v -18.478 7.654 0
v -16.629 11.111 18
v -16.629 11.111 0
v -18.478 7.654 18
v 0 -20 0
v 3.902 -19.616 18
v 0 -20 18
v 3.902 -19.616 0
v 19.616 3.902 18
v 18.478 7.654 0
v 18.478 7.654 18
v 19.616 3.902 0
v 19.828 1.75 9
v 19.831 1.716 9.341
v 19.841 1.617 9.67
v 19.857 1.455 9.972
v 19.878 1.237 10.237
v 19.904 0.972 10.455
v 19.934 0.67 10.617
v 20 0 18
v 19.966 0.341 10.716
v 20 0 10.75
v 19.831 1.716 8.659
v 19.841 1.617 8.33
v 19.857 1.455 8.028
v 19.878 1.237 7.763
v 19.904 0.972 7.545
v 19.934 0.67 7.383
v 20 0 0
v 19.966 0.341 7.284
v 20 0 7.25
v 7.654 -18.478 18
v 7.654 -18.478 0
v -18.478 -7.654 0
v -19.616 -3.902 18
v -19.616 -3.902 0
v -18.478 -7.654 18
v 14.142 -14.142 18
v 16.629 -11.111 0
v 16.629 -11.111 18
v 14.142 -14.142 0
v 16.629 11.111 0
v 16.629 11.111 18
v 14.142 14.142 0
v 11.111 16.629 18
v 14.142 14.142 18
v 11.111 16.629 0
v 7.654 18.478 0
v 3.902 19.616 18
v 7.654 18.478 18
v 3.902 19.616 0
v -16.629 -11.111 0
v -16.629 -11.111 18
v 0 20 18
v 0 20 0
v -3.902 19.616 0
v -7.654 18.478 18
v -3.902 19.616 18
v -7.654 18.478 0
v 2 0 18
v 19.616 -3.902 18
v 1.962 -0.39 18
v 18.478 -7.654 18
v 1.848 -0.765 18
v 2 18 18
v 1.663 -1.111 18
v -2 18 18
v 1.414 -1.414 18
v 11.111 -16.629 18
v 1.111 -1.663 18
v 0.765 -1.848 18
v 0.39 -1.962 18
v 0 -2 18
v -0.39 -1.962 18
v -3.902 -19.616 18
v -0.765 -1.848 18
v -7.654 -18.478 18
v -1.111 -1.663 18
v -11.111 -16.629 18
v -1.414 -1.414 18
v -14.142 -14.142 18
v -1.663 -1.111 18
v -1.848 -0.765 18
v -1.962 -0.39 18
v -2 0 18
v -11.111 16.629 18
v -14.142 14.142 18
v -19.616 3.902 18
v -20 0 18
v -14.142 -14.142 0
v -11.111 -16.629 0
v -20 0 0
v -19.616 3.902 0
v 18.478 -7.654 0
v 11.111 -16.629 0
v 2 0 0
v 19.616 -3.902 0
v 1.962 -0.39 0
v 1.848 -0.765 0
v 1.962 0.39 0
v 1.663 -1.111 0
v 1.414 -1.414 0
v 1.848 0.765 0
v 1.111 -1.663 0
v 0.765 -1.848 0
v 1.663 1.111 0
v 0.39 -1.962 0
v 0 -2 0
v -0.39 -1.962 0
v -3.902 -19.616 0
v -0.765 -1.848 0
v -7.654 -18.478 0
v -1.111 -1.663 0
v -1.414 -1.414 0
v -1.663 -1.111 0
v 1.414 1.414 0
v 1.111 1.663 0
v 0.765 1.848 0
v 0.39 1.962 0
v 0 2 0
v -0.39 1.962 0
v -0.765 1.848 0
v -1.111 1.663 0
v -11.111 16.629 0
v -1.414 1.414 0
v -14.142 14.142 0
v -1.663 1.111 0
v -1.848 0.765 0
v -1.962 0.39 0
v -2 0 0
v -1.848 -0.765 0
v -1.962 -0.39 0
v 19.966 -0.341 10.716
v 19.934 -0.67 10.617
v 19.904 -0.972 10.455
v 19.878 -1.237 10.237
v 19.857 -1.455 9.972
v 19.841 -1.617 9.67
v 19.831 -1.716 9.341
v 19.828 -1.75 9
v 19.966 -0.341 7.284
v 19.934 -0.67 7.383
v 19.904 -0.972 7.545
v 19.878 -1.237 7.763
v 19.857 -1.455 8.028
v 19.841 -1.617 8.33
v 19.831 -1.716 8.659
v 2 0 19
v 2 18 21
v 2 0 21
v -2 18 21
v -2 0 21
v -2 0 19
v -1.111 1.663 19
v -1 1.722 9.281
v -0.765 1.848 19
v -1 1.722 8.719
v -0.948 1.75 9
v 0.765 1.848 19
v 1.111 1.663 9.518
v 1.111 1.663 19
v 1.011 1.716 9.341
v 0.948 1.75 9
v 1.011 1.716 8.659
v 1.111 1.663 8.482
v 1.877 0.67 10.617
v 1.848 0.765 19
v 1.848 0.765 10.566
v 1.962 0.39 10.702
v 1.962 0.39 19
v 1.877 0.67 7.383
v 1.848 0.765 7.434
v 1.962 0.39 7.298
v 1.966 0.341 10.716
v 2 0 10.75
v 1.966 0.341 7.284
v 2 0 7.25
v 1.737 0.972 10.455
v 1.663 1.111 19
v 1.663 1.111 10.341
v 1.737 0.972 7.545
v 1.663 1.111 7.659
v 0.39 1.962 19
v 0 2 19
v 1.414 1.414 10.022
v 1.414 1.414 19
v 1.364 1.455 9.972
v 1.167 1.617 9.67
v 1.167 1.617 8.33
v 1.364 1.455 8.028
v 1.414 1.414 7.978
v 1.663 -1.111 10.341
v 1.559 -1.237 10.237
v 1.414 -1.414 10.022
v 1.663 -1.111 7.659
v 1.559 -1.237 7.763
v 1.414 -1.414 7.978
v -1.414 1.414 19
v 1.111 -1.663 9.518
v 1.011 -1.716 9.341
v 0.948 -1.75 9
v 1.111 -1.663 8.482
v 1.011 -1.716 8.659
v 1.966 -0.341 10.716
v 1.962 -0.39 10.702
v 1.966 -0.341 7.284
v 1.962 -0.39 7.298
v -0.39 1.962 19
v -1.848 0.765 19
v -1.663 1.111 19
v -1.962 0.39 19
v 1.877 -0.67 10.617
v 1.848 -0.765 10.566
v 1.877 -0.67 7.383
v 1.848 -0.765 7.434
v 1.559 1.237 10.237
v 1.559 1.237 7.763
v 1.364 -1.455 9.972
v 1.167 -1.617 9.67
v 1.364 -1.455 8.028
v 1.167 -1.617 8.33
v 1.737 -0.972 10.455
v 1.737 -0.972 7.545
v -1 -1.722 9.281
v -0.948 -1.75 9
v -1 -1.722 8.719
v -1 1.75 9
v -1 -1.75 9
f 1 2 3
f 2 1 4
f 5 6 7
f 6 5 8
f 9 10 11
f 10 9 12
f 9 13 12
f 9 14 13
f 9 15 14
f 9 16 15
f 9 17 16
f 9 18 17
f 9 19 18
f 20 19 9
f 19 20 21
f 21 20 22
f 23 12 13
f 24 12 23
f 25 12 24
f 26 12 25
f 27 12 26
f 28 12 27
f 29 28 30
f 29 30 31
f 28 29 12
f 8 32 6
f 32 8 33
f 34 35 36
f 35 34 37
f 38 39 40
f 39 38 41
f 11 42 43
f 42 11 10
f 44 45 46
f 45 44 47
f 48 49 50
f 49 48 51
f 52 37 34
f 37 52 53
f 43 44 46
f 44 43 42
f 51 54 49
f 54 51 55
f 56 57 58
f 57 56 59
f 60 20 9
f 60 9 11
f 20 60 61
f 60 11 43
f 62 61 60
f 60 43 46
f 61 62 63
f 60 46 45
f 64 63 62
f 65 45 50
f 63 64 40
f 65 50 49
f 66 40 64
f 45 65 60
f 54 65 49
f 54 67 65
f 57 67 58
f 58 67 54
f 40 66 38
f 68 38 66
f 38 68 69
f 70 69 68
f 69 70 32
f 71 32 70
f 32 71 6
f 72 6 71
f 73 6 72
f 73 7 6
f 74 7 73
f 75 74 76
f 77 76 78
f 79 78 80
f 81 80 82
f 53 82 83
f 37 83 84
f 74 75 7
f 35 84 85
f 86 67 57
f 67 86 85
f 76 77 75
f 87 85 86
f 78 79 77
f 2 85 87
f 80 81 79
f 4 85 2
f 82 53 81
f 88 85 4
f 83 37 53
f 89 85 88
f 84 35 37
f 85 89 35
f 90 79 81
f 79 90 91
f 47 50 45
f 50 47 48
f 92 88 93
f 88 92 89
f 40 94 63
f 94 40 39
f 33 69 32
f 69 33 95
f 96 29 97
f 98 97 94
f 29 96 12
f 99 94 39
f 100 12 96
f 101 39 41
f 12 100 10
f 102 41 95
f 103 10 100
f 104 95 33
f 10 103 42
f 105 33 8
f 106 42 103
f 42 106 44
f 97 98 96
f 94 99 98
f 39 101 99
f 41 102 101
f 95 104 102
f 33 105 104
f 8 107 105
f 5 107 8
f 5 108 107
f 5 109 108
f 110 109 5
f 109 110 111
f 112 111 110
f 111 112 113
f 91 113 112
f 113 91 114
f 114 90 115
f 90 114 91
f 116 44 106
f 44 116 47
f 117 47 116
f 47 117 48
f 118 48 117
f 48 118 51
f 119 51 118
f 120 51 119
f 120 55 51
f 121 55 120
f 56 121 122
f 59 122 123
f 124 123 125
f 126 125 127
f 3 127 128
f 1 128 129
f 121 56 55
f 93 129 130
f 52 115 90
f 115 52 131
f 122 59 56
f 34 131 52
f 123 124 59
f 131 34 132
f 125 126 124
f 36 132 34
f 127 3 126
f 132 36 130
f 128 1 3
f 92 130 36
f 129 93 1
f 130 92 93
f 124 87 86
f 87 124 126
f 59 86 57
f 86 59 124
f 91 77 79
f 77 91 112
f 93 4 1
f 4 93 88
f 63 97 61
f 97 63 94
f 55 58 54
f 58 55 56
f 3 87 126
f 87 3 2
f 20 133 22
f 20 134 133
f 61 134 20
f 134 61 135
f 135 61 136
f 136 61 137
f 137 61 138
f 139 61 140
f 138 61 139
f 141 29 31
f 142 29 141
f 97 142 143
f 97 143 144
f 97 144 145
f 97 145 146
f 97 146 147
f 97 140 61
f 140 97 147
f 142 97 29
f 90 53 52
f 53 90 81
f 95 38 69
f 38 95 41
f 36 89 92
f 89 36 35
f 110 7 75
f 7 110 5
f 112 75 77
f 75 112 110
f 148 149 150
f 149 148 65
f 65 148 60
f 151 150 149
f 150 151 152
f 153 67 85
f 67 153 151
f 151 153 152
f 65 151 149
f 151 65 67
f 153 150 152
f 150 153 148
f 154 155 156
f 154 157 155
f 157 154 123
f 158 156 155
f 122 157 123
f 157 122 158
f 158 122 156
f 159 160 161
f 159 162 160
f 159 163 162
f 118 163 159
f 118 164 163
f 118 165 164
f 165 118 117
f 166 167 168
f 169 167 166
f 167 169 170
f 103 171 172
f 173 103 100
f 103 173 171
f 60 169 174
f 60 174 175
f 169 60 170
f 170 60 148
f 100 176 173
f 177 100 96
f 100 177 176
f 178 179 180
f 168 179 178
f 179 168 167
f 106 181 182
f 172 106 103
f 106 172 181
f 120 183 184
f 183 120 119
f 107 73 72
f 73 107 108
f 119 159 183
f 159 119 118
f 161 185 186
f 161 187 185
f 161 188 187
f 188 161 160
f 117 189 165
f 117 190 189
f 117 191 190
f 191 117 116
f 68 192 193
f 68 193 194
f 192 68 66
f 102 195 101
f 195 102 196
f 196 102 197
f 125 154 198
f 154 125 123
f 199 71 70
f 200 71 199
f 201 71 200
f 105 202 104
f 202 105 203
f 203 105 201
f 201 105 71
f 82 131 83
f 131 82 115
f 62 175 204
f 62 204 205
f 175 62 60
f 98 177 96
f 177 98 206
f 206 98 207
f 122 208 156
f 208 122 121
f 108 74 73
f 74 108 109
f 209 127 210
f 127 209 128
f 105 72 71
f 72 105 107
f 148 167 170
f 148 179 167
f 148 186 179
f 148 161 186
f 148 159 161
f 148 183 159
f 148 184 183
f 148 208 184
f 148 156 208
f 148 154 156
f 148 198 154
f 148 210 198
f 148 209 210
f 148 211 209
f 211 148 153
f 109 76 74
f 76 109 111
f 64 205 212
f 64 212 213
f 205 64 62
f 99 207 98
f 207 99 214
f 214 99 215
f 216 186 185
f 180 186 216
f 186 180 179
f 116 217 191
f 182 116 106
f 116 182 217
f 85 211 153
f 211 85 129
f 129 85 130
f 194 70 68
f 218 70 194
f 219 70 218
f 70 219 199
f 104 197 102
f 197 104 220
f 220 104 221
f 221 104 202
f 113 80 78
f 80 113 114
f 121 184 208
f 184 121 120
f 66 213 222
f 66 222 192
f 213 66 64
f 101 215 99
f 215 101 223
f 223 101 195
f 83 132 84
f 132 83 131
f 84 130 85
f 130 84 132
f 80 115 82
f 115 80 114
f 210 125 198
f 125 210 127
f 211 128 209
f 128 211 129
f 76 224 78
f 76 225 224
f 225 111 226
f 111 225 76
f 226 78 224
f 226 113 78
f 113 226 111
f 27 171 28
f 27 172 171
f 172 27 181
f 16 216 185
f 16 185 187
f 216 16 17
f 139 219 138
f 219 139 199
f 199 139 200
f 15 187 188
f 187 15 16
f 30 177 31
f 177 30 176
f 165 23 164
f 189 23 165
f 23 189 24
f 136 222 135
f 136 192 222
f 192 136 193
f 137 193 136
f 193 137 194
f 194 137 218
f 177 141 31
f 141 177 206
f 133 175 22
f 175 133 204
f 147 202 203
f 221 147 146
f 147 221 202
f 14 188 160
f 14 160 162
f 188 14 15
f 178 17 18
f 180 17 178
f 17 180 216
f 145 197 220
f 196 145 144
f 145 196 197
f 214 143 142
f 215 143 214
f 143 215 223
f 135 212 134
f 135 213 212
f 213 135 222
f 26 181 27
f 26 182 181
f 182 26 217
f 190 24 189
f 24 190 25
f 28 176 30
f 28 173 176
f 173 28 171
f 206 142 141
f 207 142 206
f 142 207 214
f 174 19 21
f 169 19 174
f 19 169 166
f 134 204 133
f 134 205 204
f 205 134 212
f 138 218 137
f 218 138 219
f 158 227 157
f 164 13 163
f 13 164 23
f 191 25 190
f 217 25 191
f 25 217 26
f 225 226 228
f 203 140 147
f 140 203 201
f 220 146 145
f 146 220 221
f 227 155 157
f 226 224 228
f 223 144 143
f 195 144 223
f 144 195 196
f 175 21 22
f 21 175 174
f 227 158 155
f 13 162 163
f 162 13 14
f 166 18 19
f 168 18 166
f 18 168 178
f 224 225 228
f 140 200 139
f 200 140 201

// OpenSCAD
$fn = 32;

// ----------------------------------------------------------------------
// Control knob: pointer knob
// ----------------------------------------------------------------------

// --- parameters (mm) ---
rib_w = 4;                // pointer rib width
rib_h = 4;                // pointer rib height
knob_d = 40;              // knob body diameter
knob_h = 18;              // knob body height
bore_d = 4;               // shaft bore diameter
set_d = 3.5;              // set screw bore diameter

rib_poke = rib_h - 1;  // rib height above the top
total_h = knob_h + rib_h - 1;  // overall height

difference() {
  union() {
    cylinder(h = knob_h, d = knob_d);
    translate([-rib_w / 2, 0, knob_h - 1])
      cube([rib_w, knob_d / 2 - 2, rib_h]);
  }
  translate([0, 0, -1]) cylinder(h = knob_h + 2, d = bore_d);
  translate([-1, 0, knob_h / 2]) rotate([0, 90, 0])
    cylinder(h = knob_d / 2 + bore_d / 2 + 2, d = set_d);}
